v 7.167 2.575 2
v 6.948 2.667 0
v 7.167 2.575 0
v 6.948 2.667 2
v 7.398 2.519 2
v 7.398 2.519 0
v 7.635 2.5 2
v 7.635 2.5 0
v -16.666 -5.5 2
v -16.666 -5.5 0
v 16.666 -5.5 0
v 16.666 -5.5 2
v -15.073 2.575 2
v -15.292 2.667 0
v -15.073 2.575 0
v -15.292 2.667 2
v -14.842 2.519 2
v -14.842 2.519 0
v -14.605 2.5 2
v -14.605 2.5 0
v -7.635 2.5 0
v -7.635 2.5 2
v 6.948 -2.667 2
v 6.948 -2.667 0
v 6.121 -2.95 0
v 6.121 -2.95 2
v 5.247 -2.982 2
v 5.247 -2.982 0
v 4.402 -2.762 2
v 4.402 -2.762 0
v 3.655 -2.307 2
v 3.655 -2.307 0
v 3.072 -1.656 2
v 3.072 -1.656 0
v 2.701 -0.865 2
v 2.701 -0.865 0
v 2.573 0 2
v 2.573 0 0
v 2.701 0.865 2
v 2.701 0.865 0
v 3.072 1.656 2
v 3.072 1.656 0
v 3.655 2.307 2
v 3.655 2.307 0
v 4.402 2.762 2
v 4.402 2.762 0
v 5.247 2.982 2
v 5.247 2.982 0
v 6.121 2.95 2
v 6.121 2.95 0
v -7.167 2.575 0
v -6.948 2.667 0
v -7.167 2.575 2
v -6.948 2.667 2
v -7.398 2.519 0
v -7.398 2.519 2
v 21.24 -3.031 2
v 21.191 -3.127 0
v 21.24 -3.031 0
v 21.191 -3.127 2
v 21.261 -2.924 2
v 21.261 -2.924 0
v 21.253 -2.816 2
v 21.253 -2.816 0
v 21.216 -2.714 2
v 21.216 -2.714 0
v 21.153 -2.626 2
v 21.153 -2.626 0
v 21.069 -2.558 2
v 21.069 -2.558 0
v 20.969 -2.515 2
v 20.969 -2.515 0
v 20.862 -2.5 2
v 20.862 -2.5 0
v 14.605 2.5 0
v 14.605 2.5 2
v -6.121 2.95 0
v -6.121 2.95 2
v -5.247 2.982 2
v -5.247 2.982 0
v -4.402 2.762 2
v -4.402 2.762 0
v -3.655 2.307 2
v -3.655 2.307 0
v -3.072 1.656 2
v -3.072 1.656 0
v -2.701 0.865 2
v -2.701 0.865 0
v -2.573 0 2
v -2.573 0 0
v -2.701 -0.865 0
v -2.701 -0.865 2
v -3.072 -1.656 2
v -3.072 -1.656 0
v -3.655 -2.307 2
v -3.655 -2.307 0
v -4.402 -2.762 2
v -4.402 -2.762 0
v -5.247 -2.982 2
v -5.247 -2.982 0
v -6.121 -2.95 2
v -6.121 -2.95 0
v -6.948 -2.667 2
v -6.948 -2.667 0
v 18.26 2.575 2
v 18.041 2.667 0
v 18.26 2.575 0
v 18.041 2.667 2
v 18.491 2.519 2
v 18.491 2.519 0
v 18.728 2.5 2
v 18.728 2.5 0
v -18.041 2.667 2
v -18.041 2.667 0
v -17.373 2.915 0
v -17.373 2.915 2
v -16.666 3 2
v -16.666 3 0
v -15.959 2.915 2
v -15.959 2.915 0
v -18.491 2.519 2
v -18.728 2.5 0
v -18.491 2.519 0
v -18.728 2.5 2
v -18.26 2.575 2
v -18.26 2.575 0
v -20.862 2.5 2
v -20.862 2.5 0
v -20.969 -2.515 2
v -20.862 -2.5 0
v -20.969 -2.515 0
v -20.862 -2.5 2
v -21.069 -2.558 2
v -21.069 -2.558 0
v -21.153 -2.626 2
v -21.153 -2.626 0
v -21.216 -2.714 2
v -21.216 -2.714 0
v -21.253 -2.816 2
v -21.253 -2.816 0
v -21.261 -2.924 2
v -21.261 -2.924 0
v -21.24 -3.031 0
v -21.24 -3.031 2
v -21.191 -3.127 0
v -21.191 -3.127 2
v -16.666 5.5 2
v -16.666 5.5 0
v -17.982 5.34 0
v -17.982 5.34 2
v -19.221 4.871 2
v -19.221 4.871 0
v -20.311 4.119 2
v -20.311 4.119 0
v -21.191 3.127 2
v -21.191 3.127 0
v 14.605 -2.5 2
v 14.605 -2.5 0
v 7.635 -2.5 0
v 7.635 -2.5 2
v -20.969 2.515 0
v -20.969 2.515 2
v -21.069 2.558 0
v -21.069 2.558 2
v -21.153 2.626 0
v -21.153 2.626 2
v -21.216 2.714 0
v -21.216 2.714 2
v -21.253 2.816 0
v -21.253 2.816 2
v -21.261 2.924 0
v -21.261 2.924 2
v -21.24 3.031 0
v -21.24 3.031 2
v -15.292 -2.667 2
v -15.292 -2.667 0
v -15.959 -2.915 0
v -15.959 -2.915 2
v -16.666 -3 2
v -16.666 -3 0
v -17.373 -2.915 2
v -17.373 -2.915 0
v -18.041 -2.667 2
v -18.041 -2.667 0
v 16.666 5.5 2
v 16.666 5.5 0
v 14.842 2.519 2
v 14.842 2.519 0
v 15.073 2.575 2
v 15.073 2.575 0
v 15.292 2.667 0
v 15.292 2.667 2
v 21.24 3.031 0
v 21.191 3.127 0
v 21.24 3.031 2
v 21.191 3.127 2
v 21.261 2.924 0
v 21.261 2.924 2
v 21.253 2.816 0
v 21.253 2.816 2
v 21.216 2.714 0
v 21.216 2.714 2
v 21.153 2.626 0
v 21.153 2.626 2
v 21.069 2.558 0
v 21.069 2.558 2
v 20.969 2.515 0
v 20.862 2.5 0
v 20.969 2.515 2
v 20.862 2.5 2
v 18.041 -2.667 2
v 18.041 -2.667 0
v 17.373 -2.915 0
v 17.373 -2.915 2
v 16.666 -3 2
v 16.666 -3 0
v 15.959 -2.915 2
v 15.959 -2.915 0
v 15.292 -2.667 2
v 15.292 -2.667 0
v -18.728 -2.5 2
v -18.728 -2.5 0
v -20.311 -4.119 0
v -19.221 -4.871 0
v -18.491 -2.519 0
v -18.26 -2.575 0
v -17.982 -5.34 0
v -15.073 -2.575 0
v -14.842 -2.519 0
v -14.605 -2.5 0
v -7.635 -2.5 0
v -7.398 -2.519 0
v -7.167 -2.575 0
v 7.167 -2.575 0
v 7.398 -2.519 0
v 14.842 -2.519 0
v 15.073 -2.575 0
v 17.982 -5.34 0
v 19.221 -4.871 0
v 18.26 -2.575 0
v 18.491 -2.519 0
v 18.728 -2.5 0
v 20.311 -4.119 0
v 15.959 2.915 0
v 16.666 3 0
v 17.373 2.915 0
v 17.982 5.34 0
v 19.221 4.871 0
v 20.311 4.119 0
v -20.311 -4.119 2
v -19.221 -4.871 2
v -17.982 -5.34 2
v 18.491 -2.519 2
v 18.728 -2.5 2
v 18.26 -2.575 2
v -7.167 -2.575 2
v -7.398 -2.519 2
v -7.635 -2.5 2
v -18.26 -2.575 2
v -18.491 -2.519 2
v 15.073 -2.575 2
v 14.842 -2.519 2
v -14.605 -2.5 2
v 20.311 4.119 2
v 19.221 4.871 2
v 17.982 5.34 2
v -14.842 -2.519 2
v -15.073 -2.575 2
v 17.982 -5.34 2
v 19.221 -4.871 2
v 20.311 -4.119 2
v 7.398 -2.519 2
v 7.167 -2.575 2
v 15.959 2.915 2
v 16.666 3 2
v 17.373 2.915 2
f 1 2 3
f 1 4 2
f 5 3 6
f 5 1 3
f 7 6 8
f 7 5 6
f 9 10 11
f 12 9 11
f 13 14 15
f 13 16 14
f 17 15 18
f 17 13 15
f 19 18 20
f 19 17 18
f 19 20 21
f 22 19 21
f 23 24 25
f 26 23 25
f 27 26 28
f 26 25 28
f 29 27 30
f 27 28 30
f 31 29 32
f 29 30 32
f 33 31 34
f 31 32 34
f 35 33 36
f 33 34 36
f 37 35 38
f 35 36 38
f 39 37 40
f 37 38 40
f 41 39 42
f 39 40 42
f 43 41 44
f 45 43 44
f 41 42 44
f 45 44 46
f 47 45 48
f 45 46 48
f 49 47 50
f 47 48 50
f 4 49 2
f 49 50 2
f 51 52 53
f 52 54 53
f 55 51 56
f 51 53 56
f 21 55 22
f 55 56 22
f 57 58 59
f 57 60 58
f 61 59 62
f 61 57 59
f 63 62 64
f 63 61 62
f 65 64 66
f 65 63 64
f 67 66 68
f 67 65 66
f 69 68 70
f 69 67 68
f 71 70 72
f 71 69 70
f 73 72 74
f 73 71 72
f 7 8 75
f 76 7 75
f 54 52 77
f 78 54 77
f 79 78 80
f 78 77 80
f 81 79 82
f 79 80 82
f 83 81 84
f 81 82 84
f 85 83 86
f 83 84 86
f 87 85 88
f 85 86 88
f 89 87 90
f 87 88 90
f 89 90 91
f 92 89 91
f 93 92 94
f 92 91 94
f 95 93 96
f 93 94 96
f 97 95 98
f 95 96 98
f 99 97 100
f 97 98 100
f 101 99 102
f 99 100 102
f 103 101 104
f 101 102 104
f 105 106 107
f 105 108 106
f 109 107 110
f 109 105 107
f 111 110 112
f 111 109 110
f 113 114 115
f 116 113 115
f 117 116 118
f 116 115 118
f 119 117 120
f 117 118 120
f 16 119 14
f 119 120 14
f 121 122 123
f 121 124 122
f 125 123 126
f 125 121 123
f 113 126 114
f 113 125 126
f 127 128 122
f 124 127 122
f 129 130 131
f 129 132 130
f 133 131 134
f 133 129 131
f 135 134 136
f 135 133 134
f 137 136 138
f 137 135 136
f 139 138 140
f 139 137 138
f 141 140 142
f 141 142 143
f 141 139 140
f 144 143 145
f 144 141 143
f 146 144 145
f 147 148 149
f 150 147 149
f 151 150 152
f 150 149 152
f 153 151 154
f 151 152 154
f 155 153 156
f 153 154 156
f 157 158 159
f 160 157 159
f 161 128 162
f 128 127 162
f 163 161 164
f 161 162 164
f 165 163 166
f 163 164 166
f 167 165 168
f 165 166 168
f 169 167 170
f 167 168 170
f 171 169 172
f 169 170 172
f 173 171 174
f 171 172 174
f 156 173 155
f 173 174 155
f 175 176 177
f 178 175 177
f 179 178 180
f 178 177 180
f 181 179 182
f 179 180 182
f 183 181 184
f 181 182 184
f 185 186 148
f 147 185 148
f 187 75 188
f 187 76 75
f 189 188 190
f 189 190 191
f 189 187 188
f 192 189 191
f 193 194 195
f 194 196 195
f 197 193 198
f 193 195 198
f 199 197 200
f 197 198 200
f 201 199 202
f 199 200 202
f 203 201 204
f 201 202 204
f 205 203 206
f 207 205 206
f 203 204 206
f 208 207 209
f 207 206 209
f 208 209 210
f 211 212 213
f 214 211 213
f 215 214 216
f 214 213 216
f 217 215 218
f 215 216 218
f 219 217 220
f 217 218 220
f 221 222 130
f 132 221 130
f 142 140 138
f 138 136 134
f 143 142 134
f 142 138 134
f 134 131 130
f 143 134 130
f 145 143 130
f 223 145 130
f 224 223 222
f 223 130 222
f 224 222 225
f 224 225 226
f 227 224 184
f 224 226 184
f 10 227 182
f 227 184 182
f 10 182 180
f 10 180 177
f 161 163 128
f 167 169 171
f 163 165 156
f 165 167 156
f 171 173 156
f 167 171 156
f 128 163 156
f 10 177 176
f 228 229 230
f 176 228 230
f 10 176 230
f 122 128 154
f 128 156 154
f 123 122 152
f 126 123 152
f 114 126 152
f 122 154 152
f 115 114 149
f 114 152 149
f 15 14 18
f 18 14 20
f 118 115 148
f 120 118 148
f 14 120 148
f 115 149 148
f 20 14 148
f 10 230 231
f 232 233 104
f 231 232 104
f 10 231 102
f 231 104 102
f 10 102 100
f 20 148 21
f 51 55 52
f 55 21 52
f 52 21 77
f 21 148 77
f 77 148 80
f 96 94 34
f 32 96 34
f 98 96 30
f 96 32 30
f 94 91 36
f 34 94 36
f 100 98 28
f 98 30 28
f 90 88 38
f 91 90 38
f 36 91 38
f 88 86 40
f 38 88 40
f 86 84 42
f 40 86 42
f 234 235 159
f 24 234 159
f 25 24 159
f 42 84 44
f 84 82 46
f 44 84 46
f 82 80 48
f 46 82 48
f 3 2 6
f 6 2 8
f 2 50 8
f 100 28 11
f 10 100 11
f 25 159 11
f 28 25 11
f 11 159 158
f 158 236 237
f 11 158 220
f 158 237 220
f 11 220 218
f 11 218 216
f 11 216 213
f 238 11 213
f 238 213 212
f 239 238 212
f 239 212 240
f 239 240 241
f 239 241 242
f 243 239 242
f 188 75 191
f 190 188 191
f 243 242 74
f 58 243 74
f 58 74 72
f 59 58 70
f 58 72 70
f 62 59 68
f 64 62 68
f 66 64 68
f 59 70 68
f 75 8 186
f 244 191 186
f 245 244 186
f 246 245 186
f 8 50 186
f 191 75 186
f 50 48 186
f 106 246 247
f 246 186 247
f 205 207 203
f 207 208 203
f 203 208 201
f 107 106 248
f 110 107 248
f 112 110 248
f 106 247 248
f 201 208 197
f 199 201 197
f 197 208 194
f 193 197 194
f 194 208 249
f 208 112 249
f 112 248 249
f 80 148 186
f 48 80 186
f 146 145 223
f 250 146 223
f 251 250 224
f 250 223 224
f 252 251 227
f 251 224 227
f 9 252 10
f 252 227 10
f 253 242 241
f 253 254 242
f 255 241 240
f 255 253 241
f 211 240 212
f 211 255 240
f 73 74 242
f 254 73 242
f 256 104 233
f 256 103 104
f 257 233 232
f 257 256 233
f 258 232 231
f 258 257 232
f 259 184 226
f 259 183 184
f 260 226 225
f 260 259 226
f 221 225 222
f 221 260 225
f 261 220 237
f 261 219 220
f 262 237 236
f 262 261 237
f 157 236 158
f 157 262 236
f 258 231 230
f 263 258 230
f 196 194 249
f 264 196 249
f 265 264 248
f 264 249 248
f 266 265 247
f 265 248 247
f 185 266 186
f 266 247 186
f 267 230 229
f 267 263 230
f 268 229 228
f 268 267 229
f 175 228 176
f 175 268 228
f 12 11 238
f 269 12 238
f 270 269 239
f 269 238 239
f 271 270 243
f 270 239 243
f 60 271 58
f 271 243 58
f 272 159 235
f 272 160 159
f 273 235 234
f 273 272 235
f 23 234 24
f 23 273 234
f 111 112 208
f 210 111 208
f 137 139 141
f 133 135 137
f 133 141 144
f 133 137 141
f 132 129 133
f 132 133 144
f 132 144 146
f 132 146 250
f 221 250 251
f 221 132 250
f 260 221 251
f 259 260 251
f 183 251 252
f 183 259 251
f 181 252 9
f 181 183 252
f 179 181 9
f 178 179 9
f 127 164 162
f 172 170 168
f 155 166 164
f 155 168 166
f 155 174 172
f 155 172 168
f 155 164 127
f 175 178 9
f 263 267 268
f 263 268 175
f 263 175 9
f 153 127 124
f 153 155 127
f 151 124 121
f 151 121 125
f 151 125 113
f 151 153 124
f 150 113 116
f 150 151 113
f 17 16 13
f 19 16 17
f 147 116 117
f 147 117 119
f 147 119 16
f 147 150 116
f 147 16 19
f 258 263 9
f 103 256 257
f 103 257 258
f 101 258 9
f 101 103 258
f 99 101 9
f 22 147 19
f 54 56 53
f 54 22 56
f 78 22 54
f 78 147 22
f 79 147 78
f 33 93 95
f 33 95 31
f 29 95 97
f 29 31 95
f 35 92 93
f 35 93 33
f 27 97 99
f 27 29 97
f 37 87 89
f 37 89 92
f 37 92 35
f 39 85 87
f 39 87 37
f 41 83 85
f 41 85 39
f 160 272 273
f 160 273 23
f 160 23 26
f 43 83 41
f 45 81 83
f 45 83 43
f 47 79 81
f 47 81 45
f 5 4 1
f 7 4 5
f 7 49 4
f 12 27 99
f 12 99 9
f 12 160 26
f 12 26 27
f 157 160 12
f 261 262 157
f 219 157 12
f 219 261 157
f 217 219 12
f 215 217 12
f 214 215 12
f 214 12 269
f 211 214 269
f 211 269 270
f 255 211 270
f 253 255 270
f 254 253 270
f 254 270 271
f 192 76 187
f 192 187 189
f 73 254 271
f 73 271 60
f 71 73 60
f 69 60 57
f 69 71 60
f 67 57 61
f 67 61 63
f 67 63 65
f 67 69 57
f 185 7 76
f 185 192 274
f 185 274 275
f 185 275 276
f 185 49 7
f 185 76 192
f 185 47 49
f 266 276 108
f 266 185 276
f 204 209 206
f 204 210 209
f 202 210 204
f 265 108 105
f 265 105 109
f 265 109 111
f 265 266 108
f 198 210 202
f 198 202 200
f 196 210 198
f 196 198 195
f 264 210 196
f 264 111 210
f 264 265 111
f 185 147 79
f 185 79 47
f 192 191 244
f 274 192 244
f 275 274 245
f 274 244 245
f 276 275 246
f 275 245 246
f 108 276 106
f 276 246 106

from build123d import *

# Parameters (mm, degrees)
F1_DEPTH = 2
F2_R     = 1.5
F3_R     = 0.4


with BuildPart() as f1:
    # F0 (on Top) → F1 (new body)
    with BuildSketch(Plane.XY):
        with BuildLine():
            ThreePointArc((-7.2316509448, 2.5), (-4.1547013841, 2.6433820369), (-2.5733385496, 0))
            ThreePointArc((-2.5733385496, 0), (-4.1547013841, -2.6433820369), (-7.2316509448, -2.5))
            Line((-7.2316509448, -2.5), (-11.7673134743, -2.5))
            ThreePointArc((-11.7673134743, -2.5), (-13.7940116366, -4.6904157598), (-16.6662929599, -5.5))
            Line((-16.6662929599, -5.5), (16.6662929599, -5.5))
            ThreePointArc((16.6662929599, -5.5), (13.7940116366, -4.6904157598), (11.7673134743, -2.5))
            Line((11.7673134743, -2.5), (7.2316509448, -2.5))
            ThreePointArc((7.2316509448, -2.5), (2.5733385496, 0), (7.2316509448, 2.5))
            Line((7.2316509448, 2.5), (11.7673134743, 2.5))
            ThreePointArc((11.7673134743, 2.5), (13.7940116366, 4.6904157598), (16.6662929599, 5.5))
            Line((16.6662929599, 5.5), (-16.6662929599, 5.5))
            ThreePointArc((-16.6662929599, 5.5), (-13.7940116366, 4.6904157598), (-11.7673134743, 2.5))
            Line((-11.7673134743, 2.5), (-7.2316509448, 2.5))
        make_face()
        with BuildLine():
            Line((-15.0079805647, 2.5), (-11.7673134743, 2.5))
            ThreePointArc((-11.7673134743, 2.5), (-13.7940116366, 4.6904157598), (-16.6662929599, 5.5))
            ThreePointArc((-16.6662929599, 5.5), (-19.5385742831, 4.6904157598), (-21.5652724454, 2.5))
            Line((-21.5652724454, 2.5), (-18.324605355, 2.5))
            ThreePointArc((-18.324605355, 2.5), (-16.6662929599, 3), (-15.0079805647, 2.5))
        make_face()
        with BuildLine():
            ThreePointArc((-16.6662929599, -5.5), (-13.7940116366, -4.6904157598), (-11.7673134743, -2.5))
            Line((-11.7673134743, -2.5), (-15.0079805647, -2.5))
            ThreePointArc((-15.0079805647, -2.5), (-16.6662929599, -3), (-18.324605355, -2.5))
            Line((-18.324605355, -2.5), (-21.5652724454, -2.5))
            ThreePointArc((-21.5652724454, -2.5), (-19.5385742831, -4.6904157598), (-16.6662929599, -5.5))
        make_face()
        with BuildLine():
            ThreePointArc((21.5652724454, 2.5), (19.5385742831, 4.6904157598), (16.6662929599, 5.5))
            ThreePointArc((16.6662929599, 5.5), (13.7940116366, 4.6904157598), (11.7673134743, 2.5))
            Line((11.7673134743, 2.5), (15.0079805647, 2.5))
            ThreePointArc((15.0079805647, 2.5), (16.6662929599, 3), (18.324605355, 2.5))
            Line((18.324605355, 2.5), (21.5652724454, 2.5))
        make_face()
        with BuildLine():
            ThreePointArc((11.7673134743, -2.5), (13.7940116366, -4.6904157598), (16.6662929599, -5.5))
            ThreePointArc((16.6662929599, -5.5), (19.5385742831, -4.6904157598), (21.5652724454, -2.5))
            Line((21.5652724454, -2.5), (18.324605355, -2.5))
            ThreePointArc((18.324605355, -2.5), (16.6662929599, -3), (15.0079805647, -2.5))
            Line((15.0079805647, -2.5), (11.7673134743, -2.5))
        make_face()
    extrude(amount=F1_DEPTH)

    # F2
    f2_edges = [f1.edges().sort_by_distance(p)[0] for p in [
        (-15.007981, 2.5, 1),
        (-18.324605, 2.5, 1),
        (-7.231651, 2.5, 1),
        (-18.324605, -2.5, 1),
        (-15.007981, -2.5, 1),
        (-7.231651, -2.5, 1),
        (7.231651, 2.5, 1),
        (18.324605, 2.5, 1),
        (15.007981, 2.5, 1),
        (7.231651, -2.5, 1),
        (15.007981, -2.5, 1),
        (18.324605, -2.5, 1),
    ]]
    fillet(f2_edges, radius=F2_R)

    # F3
    f3_edges = [f1.edges().sort_by_distance(p)[0] for p in [
        (21.565272, 2.5, 1),
        (21.565272, -2.5, 1),
        (-21.565272, 2.5, 1),
        (-21.565272, -2.5, 1),
    ]]
    fillet(f3_edges, radius=F3_R)


solid = f1.part
